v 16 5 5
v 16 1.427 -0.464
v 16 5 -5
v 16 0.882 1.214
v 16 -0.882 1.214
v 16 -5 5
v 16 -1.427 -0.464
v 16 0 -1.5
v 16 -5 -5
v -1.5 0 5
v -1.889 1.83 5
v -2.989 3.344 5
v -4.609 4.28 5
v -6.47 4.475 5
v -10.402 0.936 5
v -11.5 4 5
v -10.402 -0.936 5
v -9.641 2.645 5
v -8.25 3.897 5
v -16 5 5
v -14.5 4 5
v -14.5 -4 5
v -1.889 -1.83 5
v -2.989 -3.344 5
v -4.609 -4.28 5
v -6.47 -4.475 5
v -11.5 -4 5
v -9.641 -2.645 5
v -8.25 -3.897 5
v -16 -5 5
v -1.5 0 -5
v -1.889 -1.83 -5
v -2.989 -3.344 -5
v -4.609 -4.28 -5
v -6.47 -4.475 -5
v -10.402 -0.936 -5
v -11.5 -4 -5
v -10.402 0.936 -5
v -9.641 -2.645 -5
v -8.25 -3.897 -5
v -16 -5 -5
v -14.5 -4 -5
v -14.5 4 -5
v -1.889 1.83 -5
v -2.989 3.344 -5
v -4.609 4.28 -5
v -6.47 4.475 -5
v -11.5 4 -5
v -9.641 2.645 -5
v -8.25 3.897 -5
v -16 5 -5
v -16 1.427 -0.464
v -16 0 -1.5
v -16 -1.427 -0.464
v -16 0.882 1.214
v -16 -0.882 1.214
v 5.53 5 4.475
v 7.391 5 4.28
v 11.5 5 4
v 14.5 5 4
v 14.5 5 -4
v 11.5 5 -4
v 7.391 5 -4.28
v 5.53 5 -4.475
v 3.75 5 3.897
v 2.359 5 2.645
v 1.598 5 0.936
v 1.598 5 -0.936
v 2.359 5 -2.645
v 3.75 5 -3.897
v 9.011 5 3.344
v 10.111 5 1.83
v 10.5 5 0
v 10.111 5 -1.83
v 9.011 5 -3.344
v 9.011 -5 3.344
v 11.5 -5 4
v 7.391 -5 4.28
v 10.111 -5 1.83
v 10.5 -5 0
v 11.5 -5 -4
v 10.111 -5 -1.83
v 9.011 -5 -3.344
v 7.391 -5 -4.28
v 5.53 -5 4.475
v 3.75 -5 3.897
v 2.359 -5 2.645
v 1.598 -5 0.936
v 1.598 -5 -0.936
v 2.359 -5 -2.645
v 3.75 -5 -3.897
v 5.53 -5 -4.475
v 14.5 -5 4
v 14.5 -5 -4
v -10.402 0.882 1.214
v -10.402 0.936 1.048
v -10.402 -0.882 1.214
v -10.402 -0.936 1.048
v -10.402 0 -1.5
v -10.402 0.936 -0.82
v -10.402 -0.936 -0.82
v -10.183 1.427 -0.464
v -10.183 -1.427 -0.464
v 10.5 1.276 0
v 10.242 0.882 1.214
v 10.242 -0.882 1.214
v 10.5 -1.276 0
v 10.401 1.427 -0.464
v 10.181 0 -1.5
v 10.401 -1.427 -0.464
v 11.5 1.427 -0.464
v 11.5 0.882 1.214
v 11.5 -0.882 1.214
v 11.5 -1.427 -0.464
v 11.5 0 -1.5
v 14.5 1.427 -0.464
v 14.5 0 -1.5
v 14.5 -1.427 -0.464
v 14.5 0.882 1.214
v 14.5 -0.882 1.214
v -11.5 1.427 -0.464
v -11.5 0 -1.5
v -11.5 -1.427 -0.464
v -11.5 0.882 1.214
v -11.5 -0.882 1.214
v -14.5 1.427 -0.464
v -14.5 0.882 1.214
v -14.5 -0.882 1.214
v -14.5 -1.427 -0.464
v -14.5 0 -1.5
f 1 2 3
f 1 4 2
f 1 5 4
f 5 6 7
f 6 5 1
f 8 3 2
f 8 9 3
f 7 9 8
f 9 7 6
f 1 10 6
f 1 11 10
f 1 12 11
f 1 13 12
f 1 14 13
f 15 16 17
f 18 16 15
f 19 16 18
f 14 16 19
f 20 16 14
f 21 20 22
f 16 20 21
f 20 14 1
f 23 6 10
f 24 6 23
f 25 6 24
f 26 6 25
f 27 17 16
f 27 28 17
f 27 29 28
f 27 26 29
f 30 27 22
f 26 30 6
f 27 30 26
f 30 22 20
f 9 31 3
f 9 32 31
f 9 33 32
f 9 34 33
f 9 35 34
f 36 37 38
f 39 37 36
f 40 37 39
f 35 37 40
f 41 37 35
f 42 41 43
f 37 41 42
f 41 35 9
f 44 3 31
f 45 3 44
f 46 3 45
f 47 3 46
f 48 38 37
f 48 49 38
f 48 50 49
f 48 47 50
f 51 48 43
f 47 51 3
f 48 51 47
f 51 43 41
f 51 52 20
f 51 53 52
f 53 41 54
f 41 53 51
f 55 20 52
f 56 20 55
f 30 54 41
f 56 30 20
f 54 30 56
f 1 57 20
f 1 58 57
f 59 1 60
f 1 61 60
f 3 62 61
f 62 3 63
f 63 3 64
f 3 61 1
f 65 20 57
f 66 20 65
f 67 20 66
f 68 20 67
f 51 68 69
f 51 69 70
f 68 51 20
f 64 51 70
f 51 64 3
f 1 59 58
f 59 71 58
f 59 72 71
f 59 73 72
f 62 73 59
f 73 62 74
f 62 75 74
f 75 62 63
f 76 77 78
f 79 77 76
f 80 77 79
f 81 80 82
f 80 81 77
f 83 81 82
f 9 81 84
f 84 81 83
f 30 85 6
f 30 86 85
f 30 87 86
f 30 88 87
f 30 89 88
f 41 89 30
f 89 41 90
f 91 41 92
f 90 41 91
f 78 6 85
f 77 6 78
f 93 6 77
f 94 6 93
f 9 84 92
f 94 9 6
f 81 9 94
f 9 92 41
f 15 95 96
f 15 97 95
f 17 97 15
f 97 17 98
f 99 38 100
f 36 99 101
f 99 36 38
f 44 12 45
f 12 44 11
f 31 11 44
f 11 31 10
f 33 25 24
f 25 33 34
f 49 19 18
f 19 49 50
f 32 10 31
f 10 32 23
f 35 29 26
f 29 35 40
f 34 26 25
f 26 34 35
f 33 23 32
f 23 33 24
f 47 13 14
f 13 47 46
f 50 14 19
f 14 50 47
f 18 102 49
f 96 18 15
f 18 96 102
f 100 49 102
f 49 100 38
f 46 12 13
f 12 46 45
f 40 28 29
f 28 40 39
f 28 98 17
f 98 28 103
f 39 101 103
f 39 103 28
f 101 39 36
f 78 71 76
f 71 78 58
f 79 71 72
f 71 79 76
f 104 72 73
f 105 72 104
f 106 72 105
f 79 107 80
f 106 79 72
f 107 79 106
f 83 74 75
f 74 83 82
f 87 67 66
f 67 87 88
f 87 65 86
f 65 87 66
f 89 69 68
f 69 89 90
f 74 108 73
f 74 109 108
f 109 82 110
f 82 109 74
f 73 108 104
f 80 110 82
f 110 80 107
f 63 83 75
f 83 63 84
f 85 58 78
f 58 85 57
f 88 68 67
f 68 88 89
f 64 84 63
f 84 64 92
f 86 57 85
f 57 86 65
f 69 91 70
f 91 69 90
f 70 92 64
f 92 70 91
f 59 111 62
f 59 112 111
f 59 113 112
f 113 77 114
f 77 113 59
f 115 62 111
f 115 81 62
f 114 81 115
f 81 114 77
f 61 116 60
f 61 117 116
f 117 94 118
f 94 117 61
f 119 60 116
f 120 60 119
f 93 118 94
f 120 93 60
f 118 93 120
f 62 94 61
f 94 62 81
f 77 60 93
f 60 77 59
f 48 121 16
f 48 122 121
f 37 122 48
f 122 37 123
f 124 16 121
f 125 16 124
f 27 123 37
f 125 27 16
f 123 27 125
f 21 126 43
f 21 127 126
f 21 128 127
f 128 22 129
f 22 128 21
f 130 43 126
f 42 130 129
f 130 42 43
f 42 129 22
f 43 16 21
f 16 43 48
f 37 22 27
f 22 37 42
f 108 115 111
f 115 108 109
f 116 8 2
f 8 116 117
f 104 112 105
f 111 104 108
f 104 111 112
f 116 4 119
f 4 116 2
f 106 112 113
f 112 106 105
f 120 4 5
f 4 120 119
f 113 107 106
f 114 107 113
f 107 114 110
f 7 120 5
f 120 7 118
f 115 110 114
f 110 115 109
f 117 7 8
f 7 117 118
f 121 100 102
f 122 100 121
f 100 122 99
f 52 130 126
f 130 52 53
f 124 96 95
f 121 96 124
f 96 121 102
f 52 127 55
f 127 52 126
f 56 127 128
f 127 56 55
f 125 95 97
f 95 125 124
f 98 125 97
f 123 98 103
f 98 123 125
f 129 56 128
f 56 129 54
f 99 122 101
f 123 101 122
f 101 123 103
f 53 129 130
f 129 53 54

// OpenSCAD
// clamp to hold 8 mm bar - for optics holders
// 8 mm bar held with M3 grubscrew
// GNU GPLv2
// by amk



%cube([200,200,0.01],true);



difference(){
translate([0, 0,0])cube([32,10,10], center=true);
translate([-6, 0,0])cylinder(14,4.5,4.5, center=true);
translate([6, 0,0])rotate([90,0,0])cylinder(14,4.5,4.5, center=true);
translate([13, 0,0])rotate([90,0,0])cube([3,8,12], center=true);
translate([-13, 0,0])cube([3,8,12], center=true);
translate([14, 0,0])rotate([0,90,0])cylinder(10,1.5,1.5, center=true);
translate([-14, 0,0])rotate([0,90,0])cylinder(10,1.5,1.5, center=true);
}
